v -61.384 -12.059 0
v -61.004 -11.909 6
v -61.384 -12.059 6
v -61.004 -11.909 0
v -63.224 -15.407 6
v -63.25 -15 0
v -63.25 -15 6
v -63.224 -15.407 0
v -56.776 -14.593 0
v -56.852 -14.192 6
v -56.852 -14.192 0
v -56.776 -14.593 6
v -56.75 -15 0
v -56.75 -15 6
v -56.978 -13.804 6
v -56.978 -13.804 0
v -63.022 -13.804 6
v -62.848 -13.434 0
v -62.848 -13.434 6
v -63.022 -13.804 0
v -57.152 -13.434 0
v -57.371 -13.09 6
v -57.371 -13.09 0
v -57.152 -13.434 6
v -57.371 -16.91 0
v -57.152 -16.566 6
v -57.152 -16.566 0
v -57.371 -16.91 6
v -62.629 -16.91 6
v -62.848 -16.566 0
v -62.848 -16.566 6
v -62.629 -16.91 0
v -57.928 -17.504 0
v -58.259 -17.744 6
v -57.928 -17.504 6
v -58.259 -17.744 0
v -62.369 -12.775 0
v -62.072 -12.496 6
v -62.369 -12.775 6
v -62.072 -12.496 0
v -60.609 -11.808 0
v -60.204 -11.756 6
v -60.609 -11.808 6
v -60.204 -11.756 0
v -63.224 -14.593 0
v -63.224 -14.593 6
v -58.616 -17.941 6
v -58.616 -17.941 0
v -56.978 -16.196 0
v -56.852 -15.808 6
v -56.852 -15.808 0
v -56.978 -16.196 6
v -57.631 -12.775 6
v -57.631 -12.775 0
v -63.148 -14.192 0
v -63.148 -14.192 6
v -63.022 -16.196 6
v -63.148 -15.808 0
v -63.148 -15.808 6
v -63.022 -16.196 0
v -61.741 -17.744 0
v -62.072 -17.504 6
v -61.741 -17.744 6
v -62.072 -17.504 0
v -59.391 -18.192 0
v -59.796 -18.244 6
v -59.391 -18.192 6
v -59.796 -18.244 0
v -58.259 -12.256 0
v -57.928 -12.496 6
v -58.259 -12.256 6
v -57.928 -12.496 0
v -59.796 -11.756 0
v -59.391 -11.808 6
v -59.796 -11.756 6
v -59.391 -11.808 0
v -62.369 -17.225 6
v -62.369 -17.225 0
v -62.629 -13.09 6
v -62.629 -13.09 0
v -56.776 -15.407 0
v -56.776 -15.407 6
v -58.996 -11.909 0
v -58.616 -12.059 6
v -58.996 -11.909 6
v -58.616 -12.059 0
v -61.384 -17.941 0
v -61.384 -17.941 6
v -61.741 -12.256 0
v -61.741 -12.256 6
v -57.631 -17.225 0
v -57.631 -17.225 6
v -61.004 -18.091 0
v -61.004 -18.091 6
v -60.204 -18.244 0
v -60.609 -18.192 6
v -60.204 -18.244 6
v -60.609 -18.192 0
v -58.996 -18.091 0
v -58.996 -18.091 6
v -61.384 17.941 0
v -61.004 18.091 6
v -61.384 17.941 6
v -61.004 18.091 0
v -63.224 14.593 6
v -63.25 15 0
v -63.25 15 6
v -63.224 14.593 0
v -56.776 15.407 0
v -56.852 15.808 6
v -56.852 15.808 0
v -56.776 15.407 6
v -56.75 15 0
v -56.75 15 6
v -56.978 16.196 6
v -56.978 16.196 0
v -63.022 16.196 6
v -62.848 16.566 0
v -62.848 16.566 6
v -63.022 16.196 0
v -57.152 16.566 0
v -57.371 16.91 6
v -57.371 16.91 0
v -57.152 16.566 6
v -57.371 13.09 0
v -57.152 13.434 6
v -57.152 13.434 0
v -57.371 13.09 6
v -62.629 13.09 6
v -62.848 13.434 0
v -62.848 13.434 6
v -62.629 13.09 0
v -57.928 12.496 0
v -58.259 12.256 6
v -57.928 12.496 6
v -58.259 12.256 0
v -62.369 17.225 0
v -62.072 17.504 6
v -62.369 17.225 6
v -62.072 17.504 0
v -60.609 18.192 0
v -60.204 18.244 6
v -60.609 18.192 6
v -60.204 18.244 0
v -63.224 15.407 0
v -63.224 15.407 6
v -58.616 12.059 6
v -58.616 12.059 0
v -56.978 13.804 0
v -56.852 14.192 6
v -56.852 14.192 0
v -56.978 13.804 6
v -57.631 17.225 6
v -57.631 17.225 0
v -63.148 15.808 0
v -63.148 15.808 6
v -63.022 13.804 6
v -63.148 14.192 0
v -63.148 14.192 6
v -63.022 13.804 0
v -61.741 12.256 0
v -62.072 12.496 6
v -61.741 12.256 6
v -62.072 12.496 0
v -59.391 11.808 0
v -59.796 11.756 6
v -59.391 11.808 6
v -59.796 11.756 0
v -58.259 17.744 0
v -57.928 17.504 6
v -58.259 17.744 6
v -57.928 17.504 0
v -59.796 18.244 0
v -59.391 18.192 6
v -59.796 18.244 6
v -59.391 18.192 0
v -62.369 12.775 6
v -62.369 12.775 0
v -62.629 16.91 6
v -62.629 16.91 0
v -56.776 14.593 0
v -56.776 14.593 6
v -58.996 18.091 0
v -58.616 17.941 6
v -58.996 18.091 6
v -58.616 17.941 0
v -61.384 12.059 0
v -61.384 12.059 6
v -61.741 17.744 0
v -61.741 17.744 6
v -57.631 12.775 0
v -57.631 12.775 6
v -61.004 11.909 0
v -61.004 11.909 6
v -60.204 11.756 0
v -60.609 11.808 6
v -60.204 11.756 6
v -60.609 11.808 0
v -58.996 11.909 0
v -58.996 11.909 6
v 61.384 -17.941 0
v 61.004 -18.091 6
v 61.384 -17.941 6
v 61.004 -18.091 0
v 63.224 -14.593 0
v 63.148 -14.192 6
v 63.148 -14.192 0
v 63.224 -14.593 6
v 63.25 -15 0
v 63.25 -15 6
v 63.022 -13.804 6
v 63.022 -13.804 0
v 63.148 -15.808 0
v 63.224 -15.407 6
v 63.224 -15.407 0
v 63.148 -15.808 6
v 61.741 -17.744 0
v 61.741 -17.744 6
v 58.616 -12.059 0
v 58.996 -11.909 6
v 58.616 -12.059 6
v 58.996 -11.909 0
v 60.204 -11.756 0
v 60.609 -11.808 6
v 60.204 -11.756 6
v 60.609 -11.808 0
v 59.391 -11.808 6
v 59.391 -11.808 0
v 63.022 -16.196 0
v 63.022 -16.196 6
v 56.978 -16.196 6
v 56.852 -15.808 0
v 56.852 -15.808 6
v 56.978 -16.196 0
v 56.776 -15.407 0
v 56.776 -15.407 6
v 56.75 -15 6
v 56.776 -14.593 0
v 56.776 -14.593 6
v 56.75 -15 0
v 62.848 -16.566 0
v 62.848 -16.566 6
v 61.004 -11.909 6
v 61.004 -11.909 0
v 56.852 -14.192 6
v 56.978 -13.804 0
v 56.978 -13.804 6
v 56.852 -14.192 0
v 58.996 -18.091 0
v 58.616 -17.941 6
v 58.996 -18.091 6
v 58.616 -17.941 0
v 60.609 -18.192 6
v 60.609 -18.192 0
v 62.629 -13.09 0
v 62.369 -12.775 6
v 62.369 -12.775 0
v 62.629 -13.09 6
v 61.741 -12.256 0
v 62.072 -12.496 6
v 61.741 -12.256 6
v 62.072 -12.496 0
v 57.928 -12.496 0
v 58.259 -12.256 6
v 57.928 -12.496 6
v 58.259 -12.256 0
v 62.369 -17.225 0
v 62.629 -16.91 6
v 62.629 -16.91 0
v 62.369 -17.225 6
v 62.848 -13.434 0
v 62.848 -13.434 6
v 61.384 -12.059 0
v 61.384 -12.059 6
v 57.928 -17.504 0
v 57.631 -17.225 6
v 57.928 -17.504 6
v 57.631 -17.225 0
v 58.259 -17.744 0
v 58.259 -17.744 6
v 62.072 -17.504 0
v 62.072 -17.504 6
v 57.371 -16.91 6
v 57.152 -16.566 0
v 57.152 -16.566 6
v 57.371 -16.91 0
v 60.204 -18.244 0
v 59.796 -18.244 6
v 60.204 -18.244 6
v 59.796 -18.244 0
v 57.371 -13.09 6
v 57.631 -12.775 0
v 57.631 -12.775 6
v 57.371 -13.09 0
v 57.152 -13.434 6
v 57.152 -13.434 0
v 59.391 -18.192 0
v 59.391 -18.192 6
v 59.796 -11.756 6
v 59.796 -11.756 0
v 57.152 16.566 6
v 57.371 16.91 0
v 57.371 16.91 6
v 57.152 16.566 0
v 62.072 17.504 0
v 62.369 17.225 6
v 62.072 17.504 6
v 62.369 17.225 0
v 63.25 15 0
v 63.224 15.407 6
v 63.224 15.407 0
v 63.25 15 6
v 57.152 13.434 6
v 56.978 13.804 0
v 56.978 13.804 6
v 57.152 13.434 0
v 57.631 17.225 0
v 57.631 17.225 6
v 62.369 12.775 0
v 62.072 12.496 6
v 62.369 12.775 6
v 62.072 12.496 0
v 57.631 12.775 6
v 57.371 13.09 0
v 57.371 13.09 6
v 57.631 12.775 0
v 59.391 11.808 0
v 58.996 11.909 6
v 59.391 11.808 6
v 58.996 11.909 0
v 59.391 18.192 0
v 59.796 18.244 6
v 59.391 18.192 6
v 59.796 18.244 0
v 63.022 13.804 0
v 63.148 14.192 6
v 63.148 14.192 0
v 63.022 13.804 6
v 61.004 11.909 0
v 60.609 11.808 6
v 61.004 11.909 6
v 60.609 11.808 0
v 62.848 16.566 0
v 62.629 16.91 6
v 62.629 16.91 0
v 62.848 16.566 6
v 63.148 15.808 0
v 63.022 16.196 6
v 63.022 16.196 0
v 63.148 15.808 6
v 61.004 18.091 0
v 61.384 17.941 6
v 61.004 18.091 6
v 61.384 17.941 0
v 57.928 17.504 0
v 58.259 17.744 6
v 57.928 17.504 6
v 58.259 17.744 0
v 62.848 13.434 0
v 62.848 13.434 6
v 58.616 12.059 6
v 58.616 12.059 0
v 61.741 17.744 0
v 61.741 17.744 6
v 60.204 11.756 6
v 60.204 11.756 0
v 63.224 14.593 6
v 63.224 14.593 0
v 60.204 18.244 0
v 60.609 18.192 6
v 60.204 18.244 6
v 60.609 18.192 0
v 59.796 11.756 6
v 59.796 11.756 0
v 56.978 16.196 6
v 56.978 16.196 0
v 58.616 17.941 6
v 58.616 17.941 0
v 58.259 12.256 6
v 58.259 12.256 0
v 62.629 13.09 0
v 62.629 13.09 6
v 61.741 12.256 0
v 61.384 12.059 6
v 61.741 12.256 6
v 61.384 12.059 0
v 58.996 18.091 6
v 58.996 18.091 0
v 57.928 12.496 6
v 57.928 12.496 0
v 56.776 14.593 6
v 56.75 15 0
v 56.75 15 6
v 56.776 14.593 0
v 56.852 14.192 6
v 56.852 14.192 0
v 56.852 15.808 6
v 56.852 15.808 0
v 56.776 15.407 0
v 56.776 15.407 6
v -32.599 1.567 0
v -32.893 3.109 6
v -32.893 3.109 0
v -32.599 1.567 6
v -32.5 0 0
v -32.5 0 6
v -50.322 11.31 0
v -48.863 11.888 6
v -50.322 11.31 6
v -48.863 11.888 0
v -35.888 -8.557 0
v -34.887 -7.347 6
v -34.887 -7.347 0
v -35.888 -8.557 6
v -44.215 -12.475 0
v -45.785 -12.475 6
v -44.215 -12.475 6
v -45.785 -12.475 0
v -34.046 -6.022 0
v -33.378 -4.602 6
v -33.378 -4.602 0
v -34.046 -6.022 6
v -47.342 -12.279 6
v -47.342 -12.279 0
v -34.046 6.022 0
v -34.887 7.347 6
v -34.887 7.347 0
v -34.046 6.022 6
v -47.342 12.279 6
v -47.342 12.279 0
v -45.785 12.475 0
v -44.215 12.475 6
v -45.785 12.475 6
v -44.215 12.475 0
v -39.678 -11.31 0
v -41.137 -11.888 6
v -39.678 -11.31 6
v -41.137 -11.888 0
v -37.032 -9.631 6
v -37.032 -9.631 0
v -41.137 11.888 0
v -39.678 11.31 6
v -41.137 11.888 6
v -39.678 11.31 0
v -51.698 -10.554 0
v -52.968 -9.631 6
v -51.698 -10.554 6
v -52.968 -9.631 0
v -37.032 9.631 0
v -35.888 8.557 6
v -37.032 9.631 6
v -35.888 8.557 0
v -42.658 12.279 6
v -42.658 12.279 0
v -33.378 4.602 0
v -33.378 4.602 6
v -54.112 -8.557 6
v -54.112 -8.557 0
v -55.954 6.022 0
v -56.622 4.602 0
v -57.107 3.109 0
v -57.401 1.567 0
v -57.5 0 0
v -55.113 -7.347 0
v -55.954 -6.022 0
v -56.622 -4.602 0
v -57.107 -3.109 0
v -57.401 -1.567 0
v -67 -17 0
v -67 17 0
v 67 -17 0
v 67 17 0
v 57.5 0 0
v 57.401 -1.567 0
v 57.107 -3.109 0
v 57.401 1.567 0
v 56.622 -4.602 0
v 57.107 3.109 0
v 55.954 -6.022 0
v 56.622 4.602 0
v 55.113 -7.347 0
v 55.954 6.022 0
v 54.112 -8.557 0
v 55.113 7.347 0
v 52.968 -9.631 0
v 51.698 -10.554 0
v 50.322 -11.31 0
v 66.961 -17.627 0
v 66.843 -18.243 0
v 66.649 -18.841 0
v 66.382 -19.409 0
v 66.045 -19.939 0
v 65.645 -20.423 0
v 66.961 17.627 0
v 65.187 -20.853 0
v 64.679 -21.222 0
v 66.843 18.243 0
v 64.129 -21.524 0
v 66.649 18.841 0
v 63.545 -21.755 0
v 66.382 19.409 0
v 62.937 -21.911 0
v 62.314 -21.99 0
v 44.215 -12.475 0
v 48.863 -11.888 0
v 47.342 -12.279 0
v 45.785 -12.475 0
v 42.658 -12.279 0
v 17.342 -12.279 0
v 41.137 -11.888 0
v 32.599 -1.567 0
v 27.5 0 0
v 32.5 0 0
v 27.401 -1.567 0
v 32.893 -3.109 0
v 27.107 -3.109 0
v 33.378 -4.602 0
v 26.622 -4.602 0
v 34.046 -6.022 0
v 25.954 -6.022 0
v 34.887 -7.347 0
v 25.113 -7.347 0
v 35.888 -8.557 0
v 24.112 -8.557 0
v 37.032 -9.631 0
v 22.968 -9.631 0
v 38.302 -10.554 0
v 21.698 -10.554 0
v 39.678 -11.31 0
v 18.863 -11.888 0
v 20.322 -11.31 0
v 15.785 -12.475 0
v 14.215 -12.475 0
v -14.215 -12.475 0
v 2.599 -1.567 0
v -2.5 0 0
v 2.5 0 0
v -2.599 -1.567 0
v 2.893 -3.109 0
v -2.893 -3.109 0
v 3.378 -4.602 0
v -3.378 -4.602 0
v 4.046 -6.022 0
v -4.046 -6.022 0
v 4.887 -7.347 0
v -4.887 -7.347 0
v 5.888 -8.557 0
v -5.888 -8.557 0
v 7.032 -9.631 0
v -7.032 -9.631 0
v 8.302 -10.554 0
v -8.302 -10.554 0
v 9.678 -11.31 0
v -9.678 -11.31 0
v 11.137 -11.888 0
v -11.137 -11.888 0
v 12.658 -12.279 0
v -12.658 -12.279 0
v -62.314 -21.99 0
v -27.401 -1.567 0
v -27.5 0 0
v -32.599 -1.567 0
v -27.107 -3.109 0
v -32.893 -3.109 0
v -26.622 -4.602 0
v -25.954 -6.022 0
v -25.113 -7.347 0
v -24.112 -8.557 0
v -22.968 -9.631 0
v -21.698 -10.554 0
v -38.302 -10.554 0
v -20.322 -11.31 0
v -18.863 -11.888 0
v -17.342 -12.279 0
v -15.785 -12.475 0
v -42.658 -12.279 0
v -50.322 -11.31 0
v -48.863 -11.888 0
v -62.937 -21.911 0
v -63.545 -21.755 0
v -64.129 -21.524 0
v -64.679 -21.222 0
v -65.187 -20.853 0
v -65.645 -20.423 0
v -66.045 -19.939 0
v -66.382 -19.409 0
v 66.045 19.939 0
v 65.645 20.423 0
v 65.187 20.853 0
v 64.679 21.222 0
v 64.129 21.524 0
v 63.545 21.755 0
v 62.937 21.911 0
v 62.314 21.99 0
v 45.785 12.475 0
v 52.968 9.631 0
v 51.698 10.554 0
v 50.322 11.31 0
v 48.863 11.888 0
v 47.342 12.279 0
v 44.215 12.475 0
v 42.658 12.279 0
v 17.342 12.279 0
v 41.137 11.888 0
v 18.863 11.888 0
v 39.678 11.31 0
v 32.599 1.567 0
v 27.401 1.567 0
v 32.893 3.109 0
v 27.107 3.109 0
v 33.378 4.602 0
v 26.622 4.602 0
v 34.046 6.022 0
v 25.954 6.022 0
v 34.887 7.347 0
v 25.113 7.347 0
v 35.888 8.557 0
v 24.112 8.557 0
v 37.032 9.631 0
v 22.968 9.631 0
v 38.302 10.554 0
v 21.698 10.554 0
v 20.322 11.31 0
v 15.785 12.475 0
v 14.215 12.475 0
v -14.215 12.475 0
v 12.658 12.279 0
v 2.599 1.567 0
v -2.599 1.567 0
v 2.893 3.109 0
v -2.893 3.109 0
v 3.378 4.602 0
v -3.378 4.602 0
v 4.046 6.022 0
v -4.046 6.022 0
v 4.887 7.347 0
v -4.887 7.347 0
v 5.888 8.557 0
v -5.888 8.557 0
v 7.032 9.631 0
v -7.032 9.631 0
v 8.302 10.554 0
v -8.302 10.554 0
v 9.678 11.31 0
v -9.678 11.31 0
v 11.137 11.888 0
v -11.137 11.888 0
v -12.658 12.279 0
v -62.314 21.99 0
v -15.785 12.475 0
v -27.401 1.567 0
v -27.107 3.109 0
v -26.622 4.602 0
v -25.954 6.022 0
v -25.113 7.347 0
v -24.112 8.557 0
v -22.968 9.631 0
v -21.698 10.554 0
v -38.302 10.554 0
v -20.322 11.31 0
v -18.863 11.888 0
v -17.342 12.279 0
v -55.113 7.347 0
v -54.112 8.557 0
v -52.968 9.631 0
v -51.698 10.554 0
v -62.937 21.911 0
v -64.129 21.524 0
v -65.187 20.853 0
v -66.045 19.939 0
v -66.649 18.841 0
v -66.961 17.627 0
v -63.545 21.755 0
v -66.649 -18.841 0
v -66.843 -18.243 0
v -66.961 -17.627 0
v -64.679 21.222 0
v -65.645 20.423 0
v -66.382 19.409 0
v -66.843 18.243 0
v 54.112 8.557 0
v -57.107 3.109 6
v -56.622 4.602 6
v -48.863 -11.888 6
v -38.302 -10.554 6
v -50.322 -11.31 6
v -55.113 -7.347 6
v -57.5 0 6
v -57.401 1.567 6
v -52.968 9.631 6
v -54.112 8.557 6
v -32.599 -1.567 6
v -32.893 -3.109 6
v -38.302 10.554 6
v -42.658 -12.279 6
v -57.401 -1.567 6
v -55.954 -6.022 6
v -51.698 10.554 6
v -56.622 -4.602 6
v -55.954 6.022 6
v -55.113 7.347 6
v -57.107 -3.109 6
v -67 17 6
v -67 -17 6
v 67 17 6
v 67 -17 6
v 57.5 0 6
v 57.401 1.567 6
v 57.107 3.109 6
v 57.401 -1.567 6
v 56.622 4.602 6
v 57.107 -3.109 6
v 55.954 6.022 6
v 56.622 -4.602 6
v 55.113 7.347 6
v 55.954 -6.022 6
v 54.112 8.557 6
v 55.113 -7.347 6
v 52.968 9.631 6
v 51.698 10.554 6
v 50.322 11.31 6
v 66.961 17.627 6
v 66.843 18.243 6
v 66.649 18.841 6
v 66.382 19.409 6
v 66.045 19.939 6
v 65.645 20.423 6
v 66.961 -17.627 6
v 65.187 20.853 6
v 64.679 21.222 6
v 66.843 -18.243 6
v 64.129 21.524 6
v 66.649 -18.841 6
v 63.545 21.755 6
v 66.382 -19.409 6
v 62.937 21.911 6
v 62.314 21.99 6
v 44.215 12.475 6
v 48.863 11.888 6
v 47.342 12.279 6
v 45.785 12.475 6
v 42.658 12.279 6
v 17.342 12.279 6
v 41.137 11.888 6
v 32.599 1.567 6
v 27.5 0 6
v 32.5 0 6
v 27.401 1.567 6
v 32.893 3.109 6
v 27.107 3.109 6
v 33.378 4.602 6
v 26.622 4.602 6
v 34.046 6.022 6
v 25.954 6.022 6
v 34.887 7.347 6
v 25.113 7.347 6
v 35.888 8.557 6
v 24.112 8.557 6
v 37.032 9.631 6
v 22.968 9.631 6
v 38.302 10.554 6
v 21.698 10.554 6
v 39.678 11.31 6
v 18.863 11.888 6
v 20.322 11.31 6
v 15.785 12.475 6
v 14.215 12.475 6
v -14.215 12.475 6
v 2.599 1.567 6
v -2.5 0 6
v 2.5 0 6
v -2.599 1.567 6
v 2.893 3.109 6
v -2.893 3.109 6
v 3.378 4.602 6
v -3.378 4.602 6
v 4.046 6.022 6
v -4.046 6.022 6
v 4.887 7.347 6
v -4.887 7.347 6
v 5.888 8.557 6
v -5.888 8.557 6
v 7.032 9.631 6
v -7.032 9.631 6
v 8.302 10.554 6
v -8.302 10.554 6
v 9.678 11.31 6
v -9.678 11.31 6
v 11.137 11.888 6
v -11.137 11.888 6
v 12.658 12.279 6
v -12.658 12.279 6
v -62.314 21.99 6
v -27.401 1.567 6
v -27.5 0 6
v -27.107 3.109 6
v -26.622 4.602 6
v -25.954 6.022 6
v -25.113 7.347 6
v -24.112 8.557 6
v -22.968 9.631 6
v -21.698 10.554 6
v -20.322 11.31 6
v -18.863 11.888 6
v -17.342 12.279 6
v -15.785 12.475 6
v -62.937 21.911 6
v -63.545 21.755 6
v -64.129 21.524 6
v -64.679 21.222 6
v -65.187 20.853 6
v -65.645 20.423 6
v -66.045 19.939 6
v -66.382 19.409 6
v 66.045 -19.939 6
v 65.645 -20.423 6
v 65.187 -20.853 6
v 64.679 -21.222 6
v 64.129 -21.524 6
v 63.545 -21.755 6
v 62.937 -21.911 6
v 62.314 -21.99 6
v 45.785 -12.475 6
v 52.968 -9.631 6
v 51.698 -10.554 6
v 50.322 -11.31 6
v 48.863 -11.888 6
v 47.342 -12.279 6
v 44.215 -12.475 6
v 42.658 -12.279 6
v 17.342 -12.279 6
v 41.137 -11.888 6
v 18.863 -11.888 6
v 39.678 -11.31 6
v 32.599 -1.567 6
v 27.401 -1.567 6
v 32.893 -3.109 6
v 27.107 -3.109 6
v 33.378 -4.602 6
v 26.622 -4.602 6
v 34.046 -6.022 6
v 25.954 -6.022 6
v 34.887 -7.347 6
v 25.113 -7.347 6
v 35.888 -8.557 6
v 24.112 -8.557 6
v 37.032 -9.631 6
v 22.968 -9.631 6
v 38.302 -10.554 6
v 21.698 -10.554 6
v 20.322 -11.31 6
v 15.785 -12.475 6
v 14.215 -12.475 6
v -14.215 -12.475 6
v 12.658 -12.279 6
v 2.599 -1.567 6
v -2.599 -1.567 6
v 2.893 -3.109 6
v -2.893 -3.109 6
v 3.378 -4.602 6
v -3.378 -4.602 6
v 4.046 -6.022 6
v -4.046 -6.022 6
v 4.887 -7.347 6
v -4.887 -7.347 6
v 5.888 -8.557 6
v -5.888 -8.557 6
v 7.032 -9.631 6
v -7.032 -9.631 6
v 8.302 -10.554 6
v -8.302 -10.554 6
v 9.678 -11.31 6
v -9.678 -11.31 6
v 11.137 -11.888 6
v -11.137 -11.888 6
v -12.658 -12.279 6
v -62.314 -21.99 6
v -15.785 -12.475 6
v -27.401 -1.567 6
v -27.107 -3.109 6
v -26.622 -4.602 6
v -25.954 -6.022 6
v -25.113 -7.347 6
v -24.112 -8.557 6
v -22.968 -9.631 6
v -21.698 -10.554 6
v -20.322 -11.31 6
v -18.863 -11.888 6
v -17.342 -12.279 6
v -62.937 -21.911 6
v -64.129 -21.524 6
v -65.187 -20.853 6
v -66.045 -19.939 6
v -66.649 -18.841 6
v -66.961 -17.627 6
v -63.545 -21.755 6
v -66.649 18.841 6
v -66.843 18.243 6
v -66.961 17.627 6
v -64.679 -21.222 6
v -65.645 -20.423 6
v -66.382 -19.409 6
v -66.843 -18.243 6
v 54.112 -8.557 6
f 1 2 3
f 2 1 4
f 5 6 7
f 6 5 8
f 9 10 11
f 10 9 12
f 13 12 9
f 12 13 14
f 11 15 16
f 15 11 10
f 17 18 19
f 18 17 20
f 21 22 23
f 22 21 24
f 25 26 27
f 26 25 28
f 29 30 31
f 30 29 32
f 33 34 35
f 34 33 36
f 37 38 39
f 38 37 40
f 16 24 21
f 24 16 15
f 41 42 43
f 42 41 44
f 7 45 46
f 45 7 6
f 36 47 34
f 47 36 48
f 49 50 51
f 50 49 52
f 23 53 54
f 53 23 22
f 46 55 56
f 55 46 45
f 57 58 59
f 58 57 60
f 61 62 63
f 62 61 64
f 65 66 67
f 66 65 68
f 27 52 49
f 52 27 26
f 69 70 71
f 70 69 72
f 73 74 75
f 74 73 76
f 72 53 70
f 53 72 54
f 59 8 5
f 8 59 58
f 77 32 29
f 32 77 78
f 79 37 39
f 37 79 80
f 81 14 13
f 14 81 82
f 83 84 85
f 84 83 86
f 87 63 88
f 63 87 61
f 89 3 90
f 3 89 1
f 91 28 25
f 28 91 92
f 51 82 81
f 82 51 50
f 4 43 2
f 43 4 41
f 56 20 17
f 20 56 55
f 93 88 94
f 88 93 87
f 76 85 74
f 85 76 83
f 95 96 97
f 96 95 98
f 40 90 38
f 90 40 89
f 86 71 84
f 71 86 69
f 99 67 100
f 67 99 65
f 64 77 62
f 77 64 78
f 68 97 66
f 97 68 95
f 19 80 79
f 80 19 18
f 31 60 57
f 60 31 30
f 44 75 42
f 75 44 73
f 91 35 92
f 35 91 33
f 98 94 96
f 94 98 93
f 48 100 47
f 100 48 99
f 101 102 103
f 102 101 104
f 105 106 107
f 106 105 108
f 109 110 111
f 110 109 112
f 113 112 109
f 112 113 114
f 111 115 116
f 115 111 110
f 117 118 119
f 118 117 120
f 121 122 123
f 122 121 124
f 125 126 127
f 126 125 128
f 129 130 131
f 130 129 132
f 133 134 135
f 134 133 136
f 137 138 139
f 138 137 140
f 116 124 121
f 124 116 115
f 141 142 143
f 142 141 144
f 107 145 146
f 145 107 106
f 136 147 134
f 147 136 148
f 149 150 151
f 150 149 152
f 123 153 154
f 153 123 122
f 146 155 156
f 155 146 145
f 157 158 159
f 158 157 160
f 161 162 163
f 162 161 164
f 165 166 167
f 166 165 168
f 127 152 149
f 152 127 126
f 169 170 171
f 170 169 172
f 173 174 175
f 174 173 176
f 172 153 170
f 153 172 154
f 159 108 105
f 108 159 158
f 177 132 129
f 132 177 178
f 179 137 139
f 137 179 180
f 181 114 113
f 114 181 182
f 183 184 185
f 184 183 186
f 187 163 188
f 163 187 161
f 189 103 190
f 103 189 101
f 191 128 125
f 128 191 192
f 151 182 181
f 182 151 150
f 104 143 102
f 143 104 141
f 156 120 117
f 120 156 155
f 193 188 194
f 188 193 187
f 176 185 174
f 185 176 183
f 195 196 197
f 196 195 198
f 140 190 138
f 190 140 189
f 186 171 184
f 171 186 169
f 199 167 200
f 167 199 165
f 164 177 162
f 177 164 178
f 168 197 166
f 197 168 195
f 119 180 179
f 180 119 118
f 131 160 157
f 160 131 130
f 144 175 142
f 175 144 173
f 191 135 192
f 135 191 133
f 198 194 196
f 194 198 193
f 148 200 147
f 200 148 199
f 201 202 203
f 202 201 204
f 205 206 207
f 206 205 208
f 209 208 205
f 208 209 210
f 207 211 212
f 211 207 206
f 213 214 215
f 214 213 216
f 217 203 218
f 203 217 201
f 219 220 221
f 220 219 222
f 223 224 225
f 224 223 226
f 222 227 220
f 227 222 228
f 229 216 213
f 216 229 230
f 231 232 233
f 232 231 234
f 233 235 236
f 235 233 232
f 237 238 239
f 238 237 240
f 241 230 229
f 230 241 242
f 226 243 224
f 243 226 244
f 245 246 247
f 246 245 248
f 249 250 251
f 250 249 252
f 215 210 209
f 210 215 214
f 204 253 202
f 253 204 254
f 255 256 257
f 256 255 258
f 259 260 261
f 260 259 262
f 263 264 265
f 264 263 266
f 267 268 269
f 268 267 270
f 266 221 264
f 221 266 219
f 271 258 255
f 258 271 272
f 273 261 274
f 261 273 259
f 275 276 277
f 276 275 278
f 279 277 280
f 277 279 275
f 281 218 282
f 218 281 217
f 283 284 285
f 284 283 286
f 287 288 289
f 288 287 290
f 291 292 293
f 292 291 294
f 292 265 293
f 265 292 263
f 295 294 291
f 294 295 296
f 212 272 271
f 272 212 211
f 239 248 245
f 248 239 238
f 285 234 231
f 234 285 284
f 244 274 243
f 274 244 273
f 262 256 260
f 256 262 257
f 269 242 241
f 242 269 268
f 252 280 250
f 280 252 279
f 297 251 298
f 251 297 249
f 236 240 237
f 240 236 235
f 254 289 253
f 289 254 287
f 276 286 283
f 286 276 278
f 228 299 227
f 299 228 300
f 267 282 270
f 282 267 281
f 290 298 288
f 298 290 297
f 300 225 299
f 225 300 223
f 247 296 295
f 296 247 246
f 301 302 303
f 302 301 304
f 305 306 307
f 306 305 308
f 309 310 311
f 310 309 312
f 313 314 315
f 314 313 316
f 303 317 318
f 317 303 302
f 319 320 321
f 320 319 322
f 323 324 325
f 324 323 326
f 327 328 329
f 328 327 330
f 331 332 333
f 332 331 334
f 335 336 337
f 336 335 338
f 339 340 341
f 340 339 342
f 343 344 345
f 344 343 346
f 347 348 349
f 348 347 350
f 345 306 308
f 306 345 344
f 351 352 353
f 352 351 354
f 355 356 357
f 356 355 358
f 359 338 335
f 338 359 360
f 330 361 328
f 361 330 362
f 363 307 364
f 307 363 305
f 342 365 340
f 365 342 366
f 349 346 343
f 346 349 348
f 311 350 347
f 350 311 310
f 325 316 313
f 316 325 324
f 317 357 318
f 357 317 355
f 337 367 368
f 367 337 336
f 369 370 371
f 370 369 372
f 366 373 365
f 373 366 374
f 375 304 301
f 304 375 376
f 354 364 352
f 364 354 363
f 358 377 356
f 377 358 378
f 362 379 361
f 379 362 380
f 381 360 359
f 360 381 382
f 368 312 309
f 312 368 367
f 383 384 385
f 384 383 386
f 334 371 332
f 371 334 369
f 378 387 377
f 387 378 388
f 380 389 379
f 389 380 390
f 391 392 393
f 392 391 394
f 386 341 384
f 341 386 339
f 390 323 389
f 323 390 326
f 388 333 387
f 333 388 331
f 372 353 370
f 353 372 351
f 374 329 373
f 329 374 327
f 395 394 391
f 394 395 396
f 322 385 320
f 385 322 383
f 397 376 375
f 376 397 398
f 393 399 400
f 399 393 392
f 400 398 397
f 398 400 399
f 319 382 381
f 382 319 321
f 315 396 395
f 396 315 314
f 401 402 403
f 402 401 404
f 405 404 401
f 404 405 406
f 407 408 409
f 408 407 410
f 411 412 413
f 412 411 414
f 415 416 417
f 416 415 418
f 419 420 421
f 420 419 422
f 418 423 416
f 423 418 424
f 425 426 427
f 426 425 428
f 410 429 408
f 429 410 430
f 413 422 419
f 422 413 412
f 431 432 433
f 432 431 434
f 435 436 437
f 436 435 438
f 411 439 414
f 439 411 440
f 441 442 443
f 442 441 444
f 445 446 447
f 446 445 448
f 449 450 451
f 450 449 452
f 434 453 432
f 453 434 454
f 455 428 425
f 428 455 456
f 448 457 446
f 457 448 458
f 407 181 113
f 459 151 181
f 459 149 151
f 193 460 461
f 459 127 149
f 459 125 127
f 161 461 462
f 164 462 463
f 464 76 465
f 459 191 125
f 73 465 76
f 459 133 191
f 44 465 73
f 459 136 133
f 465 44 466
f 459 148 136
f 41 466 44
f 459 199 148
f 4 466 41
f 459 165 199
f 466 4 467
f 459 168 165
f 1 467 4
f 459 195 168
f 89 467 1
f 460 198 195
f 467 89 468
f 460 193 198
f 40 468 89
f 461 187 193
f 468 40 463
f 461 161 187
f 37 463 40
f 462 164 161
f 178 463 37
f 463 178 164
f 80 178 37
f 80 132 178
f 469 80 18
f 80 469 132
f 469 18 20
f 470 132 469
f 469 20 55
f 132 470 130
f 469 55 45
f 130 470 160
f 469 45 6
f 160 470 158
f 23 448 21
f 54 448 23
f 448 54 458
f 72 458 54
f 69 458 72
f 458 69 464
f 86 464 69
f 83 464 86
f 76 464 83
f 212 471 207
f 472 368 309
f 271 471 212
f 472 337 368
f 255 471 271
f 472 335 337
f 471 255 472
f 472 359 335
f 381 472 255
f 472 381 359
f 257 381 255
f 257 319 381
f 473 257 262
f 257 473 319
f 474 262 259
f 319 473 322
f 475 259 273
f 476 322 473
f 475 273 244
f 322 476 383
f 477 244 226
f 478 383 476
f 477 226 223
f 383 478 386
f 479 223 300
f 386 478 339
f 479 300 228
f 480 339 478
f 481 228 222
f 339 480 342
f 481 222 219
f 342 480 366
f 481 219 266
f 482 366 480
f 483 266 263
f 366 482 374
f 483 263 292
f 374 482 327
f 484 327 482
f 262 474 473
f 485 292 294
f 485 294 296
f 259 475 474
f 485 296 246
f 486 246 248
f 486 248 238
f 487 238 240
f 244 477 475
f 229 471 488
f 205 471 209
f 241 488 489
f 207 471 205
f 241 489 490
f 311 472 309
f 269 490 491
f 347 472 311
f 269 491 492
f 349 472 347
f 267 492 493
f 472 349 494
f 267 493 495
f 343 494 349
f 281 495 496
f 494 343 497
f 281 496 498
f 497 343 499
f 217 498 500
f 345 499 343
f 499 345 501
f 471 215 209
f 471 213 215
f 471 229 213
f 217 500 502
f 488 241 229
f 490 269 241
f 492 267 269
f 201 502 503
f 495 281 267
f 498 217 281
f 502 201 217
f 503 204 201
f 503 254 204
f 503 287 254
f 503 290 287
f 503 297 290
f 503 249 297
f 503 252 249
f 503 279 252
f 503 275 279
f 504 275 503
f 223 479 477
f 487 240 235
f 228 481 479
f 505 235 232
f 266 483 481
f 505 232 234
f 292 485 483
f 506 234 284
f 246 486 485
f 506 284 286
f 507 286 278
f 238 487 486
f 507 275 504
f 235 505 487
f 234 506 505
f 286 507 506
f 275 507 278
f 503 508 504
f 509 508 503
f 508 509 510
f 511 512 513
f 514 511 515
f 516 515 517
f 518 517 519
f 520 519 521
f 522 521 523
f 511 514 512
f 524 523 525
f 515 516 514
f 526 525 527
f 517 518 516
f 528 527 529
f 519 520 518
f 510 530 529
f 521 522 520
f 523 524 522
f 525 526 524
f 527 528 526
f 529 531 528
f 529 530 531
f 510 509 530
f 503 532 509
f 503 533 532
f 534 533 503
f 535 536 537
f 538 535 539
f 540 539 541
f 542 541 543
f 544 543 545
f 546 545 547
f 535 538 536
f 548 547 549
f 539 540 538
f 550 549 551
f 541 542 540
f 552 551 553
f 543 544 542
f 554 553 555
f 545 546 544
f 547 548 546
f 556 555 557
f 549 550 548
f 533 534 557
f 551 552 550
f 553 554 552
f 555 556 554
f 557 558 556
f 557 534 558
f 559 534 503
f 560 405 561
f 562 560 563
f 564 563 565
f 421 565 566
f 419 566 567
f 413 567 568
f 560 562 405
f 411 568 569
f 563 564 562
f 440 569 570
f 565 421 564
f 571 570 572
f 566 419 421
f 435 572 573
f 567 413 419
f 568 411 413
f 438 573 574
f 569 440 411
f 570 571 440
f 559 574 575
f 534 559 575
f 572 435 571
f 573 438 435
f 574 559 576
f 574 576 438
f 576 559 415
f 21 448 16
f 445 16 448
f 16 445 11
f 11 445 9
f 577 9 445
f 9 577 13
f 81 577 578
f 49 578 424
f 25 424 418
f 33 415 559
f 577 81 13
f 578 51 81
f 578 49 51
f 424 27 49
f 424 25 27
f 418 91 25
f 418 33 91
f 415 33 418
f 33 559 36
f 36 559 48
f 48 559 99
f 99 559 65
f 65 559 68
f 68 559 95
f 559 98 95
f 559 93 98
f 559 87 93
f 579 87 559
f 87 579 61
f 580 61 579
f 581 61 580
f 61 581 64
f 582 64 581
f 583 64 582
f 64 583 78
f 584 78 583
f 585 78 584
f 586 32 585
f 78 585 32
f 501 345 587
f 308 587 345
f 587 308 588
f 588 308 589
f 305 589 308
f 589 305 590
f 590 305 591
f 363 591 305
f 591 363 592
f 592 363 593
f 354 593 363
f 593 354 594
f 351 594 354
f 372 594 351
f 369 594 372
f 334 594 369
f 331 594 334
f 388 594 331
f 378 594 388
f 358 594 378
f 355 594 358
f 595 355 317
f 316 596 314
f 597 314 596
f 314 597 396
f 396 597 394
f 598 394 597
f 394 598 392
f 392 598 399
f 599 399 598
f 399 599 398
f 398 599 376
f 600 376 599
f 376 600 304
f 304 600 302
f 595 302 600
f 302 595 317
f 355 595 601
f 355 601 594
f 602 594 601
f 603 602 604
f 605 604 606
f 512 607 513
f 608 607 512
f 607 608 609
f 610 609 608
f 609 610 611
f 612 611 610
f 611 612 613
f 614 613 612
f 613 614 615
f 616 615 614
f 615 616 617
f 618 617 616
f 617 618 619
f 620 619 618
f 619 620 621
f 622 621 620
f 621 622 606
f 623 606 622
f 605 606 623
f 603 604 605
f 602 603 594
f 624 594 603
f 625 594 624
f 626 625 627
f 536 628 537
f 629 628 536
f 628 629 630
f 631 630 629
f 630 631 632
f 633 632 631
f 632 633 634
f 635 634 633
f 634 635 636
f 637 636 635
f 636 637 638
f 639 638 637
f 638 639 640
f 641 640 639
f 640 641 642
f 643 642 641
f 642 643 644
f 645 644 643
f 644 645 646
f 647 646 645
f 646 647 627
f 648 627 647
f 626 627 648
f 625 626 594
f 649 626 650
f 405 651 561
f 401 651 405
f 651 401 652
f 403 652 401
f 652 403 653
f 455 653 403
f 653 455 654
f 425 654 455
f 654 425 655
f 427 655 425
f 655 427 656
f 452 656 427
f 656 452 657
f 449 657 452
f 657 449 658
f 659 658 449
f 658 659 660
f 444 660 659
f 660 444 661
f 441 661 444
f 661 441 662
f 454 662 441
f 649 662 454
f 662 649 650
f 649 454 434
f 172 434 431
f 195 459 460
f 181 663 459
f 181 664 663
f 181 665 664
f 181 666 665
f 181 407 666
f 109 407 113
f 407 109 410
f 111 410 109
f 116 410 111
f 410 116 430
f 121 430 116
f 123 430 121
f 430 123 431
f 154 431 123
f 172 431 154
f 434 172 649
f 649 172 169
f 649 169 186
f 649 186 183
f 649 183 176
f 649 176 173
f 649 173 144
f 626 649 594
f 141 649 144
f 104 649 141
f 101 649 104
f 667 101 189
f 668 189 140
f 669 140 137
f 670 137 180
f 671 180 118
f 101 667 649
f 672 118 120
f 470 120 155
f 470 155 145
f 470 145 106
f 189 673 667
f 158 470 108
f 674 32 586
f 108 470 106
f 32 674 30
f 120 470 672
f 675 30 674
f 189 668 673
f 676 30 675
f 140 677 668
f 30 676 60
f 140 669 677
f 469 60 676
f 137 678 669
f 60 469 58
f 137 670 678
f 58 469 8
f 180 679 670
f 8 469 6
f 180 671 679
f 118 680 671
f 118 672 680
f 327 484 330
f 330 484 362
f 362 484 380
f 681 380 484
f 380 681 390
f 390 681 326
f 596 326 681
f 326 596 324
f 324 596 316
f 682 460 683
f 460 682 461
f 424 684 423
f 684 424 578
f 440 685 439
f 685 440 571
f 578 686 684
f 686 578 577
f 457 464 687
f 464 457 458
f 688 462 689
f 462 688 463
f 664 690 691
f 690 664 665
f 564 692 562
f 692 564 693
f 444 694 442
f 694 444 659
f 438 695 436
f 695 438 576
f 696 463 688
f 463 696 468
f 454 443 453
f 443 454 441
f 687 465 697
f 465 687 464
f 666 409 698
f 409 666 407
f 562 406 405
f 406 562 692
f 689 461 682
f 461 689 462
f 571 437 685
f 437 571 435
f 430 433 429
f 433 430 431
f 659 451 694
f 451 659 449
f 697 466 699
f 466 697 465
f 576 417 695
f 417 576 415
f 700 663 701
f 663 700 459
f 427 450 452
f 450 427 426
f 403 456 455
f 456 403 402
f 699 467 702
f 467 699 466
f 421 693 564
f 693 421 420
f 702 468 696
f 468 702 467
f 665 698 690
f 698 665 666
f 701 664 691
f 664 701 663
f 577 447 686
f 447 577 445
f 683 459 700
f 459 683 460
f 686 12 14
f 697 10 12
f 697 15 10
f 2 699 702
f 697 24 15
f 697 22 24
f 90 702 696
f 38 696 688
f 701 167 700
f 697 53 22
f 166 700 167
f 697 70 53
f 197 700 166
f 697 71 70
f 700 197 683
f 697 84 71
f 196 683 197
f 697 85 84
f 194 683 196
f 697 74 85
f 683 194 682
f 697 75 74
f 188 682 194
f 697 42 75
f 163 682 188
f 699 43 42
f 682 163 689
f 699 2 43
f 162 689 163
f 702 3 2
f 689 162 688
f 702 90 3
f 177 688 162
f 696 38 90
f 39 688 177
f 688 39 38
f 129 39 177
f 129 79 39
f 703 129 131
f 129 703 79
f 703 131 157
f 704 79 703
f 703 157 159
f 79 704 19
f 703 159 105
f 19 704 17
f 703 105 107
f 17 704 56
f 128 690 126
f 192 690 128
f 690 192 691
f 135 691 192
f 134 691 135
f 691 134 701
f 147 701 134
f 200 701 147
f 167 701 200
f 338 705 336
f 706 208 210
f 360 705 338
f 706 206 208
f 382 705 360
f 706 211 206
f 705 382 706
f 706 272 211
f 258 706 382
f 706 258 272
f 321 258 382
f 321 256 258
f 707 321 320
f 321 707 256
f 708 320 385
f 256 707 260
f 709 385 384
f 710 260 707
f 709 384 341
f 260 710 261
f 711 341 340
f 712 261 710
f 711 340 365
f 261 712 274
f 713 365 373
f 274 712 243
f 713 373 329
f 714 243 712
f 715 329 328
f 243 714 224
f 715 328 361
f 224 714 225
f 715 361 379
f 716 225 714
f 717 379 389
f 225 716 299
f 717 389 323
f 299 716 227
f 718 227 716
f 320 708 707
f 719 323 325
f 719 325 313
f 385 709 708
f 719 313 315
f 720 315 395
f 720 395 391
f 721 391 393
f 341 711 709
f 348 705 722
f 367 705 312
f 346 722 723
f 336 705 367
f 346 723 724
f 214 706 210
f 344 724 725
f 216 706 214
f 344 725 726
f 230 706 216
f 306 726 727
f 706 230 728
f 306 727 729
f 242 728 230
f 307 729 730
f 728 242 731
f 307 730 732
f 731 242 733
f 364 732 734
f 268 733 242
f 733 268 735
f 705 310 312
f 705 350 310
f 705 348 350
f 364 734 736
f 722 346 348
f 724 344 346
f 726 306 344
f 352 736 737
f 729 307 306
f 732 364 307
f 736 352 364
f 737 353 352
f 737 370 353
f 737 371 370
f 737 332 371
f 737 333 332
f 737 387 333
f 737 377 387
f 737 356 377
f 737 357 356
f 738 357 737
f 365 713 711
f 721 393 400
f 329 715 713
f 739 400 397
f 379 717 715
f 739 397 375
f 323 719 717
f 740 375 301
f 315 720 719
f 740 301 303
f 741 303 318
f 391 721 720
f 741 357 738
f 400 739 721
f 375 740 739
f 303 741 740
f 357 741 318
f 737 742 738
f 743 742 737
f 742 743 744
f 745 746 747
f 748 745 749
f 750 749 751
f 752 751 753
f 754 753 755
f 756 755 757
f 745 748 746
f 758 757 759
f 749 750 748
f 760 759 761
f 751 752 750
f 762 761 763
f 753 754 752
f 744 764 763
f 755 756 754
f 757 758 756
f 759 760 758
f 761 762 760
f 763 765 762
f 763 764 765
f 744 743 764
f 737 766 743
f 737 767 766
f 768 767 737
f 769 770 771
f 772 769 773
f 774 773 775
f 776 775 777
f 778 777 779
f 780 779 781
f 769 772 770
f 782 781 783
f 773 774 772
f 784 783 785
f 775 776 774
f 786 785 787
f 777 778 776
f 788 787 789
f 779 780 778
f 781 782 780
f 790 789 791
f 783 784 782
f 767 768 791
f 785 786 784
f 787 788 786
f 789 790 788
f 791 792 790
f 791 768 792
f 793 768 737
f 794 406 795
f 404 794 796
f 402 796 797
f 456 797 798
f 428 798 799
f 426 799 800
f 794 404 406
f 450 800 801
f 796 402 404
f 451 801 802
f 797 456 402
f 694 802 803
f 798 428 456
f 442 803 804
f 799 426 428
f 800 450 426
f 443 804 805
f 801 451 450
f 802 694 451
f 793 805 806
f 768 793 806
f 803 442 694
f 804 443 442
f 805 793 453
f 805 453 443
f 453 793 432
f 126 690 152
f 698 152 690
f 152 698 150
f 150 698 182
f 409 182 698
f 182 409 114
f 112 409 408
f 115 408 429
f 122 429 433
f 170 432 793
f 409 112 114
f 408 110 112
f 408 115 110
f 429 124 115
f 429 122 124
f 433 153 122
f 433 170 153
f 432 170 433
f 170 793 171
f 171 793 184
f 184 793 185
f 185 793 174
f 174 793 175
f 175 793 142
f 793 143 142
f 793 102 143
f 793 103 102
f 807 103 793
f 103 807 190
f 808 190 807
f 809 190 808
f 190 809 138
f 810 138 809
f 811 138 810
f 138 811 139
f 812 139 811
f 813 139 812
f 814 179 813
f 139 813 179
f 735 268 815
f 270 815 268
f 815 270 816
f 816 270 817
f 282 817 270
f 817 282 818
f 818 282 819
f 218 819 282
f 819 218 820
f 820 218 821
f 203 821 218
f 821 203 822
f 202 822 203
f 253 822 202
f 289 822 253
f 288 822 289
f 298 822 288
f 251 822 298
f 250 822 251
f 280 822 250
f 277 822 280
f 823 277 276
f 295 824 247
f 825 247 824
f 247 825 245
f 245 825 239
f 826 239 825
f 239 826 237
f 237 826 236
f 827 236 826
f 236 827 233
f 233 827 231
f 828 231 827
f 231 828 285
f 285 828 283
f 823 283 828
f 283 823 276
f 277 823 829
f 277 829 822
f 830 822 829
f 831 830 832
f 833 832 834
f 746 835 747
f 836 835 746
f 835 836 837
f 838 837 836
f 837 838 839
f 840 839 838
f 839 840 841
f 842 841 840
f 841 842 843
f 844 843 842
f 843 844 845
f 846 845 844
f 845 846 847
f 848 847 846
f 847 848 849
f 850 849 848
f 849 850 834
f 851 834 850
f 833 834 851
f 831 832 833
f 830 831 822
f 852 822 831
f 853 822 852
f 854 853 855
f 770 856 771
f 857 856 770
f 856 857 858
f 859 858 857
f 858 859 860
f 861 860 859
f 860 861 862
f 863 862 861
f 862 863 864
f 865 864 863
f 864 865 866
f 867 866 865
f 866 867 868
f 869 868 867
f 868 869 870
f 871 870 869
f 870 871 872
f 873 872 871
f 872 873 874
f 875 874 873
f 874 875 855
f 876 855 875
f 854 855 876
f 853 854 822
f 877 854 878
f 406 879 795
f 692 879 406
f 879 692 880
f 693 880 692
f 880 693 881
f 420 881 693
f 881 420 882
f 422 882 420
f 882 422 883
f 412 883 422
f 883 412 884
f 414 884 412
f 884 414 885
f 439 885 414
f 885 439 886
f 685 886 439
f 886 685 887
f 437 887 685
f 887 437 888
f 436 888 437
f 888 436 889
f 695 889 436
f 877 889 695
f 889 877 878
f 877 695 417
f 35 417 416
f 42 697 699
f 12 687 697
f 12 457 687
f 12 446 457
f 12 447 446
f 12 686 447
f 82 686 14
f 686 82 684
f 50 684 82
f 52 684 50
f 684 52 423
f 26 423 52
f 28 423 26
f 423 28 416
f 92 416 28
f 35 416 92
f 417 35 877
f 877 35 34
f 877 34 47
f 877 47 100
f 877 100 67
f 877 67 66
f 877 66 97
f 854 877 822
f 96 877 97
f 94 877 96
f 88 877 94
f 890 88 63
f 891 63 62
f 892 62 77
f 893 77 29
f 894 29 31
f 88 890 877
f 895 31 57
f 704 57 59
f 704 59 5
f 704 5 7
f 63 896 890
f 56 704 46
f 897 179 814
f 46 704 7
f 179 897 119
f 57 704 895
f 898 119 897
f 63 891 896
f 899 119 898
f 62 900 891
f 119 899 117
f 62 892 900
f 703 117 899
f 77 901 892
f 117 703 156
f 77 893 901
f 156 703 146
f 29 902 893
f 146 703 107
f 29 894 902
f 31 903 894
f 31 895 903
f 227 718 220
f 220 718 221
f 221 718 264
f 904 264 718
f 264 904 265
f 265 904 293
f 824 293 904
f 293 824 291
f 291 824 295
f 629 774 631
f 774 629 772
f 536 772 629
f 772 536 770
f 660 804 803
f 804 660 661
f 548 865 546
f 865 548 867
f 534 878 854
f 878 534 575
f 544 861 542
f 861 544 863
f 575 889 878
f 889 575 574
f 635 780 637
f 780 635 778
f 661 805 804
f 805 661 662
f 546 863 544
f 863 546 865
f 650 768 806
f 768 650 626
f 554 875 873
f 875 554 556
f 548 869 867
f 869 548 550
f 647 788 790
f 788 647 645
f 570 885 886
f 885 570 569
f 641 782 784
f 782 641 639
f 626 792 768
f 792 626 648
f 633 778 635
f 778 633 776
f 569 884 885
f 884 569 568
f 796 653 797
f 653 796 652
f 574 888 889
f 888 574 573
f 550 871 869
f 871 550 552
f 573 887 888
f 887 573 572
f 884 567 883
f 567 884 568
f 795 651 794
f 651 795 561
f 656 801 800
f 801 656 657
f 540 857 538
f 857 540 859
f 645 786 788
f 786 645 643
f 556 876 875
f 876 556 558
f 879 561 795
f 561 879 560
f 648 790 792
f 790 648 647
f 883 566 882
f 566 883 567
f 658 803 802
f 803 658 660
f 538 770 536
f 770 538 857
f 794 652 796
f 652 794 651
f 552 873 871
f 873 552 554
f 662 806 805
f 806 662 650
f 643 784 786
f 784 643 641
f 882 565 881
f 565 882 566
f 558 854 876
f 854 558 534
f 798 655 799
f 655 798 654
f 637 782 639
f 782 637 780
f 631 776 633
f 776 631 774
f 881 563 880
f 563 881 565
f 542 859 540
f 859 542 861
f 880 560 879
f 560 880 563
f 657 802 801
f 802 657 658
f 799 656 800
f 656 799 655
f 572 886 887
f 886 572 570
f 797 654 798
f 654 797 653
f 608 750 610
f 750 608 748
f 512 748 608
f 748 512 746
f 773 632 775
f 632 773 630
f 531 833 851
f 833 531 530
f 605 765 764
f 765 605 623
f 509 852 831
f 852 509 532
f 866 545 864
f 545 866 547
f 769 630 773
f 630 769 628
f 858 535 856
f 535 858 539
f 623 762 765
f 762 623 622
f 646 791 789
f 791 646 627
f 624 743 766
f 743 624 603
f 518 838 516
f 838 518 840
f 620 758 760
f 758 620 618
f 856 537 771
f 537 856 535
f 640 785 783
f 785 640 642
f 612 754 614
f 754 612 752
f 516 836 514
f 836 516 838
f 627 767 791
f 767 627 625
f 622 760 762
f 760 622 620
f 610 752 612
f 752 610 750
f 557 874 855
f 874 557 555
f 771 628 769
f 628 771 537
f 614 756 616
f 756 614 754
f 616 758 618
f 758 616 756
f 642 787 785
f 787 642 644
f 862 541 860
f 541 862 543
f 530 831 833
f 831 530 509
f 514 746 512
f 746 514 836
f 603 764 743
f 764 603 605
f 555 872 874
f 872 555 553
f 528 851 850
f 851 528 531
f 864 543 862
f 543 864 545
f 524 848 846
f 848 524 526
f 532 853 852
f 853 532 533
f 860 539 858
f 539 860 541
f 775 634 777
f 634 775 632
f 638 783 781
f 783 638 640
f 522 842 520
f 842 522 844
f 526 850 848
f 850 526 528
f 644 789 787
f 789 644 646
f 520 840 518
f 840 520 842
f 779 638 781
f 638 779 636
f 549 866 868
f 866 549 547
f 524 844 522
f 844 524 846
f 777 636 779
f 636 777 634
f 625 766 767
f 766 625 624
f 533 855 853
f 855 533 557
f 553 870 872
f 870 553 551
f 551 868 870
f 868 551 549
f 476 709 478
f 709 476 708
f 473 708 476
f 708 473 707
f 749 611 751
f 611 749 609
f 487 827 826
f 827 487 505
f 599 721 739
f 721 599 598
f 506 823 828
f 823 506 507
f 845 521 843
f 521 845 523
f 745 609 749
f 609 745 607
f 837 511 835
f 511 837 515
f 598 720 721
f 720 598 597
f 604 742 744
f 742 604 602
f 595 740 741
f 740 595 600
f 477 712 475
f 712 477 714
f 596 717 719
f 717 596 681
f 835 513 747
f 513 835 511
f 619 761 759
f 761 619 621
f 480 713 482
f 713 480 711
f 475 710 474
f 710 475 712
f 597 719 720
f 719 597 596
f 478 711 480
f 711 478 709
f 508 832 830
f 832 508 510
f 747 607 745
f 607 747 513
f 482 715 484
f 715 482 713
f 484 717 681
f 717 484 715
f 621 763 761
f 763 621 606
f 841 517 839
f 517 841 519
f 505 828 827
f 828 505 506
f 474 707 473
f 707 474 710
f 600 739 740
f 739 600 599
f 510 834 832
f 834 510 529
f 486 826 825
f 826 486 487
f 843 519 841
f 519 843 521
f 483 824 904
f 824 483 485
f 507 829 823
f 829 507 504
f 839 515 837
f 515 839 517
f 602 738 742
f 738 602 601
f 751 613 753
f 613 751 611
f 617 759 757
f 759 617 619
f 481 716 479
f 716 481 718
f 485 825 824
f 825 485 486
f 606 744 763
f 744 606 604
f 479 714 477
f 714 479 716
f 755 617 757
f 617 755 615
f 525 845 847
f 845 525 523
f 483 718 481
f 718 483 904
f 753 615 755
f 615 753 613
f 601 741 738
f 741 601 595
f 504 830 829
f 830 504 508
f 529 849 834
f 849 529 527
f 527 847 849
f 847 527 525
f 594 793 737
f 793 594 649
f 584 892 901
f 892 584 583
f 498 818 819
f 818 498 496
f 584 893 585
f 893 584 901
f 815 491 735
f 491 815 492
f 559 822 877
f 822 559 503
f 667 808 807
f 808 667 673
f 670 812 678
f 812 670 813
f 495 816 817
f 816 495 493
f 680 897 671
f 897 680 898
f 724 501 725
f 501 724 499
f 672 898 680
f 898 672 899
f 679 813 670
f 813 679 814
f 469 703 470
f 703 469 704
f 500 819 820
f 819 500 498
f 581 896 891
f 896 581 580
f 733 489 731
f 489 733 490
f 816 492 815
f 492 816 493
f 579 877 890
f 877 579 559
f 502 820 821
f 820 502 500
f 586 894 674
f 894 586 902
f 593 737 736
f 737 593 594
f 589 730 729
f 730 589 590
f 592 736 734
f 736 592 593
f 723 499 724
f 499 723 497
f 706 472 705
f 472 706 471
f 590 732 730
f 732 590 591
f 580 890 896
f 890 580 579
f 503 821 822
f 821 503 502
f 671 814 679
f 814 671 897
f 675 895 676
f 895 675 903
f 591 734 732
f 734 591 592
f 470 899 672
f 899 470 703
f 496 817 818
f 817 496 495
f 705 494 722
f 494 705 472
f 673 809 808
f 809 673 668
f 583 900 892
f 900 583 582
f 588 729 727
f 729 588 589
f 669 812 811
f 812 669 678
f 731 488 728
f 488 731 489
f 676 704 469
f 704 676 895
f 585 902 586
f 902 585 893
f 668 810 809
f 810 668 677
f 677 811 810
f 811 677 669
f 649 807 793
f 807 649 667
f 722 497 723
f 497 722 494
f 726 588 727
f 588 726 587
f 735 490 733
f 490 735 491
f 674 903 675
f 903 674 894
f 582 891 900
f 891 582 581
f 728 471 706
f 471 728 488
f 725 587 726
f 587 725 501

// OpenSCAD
$fn = 50;


difference() {
	union() {
		hull() {
			translate(v = [-62.0000000000, 17.0000000000, 0]) {
				cylinder(h = 6, r = 5);
			}
			translate(v = [62.0000000000, 17.0000000000, 0]) {
				cylinder(h = 6, r = 5);
			}
			translate(v = [-62.0000000000, -17.0000000000, 0]) {
				cylinder(h = 6, r = 5);
			}
			translate(v = [62.0000000000, -17.0000000000, 0]) {
				cylinder(h = 6, r = 5);
			}
		}
	}
	union() {
		#translate(v = [-60.0000000000, -15.0000000000, -100.0000000000]) {
			cylinder(h = 200, r = 3.2500000000);
		}
		#translate(v = [-60.0000000000, 15.0000000000, -100.0000000000]) {
			cylinder(h = 200, r = 3.2500000000);
		}
		#translate(v = [60.0000000000, -15.0000000000, -100.0000000000]) {
			cylinder(h = 200, r = 3.2500000000);
		}
		#translate(v = [60.0000000000, 15.0000000000, -100.0000000000]) {
			cylinder(h = 200, r = 3.2500000000);
		}
		#translate(v = [-45.0000000000, 0, 0]) {
			cylinder(h = 6, r = 12.5000000000);
		}
		#translate(v = [-15.0000000000, 0, 0]) {
			cylinder(h = 6, r = 12.5000000000);
		}
		#translate(v = [15.0000000000, 0, 0]) {
			cylinder(h = 6, r = 12.5000000000);
		}
		#translate(v = [45.0000000000, 0, 0]) {
			cylinder(h = 6, r = 12.5000000000);
		}
	}
}
